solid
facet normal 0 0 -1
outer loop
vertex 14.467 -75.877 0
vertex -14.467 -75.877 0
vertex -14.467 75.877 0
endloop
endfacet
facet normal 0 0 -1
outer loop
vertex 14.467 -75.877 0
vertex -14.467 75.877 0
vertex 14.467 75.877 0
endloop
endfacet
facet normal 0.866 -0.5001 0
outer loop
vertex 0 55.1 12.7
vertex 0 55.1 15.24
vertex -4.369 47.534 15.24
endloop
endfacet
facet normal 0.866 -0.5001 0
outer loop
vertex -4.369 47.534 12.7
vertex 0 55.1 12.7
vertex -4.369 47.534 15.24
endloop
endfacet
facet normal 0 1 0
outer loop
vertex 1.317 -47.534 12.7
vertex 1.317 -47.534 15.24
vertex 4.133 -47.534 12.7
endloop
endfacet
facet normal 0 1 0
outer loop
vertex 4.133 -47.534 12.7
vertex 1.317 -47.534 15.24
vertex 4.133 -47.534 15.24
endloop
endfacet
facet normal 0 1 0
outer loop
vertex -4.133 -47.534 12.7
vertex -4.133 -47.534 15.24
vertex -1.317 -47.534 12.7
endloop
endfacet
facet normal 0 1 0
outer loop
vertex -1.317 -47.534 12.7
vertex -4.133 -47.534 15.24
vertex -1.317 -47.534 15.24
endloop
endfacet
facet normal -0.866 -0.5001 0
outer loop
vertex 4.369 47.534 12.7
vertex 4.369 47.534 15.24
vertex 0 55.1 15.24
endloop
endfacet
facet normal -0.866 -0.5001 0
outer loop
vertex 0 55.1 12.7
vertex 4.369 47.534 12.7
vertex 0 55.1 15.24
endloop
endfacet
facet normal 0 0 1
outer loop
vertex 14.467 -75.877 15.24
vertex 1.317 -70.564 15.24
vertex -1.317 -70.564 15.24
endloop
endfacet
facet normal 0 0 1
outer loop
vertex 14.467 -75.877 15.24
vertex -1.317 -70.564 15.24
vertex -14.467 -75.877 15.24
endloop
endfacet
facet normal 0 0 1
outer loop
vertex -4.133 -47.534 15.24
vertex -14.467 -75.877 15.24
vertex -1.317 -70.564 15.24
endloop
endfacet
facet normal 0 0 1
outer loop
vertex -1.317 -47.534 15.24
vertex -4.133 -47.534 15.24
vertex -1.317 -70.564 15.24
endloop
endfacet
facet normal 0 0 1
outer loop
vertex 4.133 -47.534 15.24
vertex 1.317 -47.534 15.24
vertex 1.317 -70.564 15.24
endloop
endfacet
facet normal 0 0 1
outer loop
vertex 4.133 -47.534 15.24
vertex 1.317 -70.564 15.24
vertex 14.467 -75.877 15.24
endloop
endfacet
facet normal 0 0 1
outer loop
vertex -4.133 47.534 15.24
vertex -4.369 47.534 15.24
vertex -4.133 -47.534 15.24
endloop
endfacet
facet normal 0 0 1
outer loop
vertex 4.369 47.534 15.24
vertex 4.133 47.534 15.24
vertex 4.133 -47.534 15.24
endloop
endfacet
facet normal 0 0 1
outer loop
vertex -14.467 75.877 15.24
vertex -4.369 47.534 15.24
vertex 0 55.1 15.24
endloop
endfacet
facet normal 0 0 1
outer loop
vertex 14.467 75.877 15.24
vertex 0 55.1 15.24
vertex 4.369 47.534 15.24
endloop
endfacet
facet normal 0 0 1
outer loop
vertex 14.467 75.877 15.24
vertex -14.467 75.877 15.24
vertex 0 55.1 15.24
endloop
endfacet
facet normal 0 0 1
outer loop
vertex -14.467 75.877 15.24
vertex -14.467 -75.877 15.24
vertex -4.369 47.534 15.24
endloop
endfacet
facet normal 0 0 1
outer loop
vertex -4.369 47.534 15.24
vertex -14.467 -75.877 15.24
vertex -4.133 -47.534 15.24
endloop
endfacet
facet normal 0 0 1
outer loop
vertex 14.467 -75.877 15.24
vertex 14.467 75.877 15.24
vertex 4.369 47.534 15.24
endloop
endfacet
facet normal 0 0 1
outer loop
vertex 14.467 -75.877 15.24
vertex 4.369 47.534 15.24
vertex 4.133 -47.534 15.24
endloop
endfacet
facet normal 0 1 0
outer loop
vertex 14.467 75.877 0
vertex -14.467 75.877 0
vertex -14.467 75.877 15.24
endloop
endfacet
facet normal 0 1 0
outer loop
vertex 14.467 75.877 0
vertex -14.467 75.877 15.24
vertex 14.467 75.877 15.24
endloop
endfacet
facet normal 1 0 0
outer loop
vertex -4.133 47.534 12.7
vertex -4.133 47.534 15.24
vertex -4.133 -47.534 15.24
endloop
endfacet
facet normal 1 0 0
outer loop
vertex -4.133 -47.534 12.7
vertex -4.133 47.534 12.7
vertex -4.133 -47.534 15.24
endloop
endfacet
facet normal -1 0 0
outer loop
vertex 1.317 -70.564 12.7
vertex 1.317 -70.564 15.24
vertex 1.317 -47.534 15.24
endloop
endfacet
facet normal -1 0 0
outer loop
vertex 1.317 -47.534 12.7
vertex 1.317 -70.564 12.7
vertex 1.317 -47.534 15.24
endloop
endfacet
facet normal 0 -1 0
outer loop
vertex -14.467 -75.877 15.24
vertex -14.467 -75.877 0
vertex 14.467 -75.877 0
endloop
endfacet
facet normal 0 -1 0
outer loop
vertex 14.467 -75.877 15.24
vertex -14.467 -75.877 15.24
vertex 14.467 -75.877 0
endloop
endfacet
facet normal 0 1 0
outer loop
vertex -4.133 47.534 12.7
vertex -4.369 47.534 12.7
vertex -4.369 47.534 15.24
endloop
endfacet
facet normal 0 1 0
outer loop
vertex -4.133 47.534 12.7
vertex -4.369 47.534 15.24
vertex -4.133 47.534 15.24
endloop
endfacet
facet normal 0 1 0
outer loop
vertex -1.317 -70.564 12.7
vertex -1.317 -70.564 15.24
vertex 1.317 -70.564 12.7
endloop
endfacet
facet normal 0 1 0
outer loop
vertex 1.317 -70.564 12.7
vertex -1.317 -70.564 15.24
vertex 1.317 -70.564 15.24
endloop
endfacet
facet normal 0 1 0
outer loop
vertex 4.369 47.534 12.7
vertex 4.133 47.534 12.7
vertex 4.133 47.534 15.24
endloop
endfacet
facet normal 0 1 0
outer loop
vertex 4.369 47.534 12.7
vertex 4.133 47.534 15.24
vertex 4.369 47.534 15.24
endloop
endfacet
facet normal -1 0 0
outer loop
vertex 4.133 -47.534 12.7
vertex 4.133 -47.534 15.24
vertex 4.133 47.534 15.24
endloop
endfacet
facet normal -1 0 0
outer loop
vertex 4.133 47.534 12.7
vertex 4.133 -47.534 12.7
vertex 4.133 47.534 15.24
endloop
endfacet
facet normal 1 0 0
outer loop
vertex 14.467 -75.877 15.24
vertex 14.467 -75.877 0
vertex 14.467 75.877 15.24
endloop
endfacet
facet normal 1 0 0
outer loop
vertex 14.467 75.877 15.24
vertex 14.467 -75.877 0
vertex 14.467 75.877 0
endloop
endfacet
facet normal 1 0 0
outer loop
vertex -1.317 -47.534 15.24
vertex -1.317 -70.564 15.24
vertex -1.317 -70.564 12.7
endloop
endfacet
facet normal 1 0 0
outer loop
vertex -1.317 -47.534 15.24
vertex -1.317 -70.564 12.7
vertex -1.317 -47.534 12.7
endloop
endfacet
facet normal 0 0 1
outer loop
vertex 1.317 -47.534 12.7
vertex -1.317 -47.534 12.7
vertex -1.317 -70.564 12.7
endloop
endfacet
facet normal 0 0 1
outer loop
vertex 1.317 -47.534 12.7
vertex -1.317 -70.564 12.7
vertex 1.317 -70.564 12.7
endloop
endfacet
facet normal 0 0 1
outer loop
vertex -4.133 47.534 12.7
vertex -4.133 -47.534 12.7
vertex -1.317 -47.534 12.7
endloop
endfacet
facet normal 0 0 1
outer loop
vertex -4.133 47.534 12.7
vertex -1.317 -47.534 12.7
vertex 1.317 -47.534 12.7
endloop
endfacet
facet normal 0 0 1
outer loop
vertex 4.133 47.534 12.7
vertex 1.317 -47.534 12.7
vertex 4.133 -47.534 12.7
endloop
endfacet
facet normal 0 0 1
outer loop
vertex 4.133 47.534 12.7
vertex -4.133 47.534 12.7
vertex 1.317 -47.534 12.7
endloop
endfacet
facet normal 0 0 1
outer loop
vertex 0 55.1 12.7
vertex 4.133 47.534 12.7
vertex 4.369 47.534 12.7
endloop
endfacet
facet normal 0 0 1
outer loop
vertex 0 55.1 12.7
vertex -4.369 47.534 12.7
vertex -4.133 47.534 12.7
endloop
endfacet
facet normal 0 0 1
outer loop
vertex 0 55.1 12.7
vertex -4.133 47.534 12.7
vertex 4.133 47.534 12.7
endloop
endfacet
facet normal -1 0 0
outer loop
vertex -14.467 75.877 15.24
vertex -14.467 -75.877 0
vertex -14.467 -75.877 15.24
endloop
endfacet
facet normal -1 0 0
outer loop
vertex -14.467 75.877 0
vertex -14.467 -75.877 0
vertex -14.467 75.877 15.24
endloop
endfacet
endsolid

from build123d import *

# Parameters (mm, degrees)
F0_W     = 28.933504
F0_H     = 151.753276
F1_DEPTH = 15.24
F2_W     = 2.633254
F2_H     = 23.030557
F3_DEPTH = 2.54


with BuildPart() as f1:
    # F0 (on Top) → F1 (new body)
    with BuildSketch(Plane.XY):
        Rectangle(F0_W, F0_H)
    extrude(amount=F1_DEPTH)

    # F2 (on face) → F3 (cut)
    with BuildSketch(Plane.XY.offset(15.24)):
        Polygon((-4.133359, 47.533616), (4.133359, 47.533616), (4.368631, 47.533616), (0, 55.100307), (-4.368631, 47.533616), align=None)
        Polygon((4.133359, -47.533616), (4.133359, 47.533616), (-4.133359, 47.533616), (-4.133359, -47.533616), (-1.316627, -47.533616), (1.316627, -47.533616), align=None)
        with Locations((0, -59.048894)):
            Rectangle(F2_W, F2_H)
    extrude(amount=-F3_DEPTH, mode=Mode.SUBTRACT)


solid = f1.part
